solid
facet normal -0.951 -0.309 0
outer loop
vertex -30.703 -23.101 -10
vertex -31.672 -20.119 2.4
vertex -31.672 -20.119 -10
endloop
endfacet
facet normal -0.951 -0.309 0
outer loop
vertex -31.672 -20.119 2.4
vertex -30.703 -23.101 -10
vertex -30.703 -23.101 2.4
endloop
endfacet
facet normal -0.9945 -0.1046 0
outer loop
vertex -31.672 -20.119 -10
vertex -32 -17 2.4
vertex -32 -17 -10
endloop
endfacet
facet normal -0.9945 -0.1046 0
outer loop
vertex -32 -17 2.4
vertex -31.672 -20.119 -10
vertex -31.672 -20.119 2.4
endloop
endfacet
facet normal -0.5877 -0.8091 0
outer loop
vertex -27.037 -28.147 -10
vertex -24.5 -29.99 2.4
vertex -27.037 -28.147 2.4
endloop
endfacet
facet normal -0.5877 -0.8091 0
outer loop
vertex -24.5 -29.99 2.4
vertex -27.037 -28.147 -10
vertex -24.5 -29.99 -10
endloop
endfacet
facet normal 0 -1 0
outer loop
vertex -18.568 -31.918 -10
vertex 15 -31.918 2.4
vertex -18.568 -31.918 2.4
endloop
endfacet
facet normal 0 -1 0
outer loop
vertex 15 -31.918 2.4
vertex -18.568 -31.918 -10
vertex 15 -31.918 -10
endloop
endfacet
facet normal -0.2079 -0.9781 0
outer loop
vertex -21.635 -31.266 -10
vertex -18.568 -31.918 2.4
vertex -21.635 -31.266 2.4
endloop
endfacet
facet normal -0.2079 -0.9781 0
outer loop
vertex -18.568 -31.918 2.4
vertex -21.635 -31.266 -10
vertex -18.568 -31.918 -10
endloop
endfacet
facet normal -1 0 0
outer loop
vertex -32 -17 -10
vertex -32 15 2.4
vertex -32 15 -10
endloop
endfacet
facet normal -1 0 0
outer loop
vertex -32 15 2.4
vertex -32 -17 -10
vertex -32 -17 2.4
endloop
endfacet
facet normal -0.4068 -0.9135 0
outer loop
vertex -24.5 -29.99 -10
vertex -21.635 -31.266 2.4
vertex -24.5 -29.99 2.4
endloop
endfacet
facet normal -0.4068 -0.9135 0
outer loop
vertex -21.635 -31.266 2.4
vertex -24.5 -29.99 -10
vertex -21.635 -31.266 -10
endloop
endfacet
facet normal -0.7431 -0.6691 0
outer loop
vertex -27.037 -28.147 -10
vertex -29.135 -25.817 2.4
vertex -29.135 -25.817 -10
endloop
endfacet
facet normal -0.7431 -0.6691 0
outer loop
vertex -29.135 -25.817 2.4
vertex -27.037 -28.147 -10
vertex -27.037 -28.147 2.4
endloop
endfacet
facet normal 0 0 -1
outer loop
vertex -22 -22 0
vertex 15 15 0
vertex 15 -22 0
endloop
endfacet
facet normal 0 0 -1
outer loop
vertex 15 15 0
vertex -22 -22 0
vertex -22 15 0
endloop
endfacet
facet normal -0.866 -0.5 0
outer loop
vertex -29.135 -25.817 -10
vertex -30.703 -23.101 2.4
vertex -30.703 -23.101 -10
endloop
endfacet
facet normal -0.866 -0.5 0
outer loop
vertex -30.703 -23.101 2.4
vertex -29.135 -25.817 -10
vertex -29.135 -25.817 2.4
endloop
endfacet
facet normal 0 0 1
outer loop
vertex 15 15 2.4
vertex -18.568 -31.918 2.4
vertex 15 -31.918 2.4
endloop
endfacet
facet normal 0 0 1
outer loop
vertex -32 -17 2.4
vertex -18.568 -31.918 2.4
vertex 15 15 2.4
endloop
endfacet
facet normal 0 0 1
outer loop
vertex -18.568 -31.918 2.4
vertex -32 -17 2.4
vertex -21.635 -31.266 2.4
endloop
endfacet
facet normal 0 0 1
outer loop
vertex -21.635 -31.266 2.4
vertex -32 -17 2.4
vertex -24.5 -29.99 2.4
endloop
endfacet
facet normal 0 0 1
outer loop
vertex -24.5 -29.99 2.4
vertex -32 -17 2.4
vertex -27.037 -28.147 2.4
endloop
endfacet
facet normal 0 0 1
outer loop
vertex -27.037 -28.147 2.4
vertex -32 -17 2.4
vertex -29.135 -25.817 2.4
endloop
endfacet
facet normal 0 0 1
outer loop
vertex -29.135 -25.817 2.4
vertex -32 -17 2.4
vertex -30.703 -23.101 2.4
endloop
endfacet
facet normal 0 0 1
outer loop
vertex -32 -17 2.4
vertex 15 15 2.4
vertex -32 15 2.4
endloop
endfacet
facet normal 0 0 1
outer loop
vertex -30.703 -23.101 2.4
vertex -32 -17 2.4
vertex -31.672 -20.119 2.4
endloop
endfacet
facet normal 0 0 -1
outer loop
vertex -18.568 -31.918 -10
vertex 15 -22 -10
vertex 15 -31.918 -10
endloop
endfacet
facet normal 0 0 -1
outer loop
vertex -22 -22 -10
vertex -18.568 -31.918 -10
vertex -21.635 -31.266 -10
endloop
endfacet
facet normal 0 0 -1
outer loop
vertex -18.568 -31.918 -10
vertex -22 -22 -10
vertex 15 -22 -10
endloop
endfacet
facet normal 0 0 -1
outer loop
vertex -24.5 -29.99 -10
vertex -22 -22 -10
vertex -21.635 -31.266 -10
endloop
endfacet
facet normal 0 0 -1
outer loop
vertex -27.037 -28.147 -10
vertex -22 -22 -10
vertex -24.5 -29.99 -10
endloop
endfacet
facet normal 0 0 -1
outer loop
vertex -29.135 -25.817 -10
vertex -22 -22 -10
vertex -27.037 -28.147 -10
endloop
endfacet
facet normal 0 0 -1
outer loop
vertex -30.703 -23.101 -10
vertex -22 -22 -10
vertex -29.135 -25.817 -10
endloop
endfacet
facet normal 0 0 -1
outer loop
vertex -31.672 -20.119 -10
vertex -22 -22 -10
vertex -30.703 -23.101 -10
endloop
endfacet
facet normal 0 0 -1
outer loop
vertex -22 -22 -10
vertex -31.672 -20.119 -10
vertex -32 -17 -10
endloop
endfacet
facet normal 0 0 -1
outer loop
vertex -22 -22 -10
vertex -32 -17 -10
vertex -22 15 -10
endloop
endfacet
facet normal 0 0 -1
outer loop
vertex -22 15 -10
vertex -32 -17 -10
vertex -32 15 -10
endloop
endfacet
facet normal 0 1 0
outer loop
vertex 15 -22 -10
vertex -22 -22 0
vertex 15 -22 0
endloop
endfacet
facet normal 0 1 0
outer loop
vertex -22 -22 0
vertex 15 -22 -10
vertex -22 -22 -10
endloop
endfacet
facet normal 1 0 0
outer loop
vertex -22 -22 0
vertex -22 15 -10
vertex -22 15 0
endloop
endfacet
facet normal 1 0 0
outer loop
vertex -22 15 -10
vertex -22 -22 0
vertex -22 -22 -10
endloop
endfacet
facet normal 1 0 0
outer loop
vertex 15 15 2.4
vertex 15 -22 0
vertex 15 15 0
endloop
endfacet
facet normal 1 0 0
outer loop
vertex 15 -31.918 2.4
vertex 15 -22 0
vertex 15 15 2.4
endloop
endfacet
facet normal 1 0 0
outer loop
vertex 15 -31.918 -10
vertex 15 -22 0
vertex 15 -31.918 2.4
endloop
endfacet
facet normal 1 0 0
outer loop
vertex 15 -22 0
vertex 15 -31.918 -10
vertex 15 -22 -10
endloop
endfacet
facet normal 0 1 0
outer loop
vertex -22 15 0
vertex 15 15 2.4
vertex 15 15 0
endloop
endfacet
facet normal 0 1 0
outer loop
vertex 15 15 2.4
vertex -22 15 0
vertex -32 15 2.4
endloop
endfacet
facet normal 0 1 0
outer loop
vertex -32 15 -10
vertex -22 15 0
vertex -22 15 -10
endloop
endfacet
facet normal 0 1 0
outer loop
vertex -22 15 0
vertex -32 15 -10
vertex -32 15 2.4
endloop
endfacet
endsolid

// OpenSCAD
// file: ../../lib/project/util.scad
// lib/project/util.scad

module rounded_rect_2d(size = [10, 10], r = 2) {
  x = size[0];
  y = size[1];
  rr = min(r, min(x, y) / 2);

  hull() {
    for (sx = [-1, 1], sy = [-1, 1]) {
      translate([sx * (x / 2 - rr), sy * (y / 2 - rr)])
        circle(r = rr);
    }
  }
}
// file: ../../lib/project/params.scad
// lib/project/params.scad
// Shared project parameters for the final tray and all fit-test models.

debug = false;

// Main tray footprint.
tray_corner_r = 15;

// Top tray shell.
tray_floor_t = 2.4;
tray_wall_h = 9;
top_wall_w = 10;

// Underside support lip and rear support section.
support_lip_drop = 10;
support_lip_w = 10;
console_clear_w = 320;
side_lip_run = 170;
tray_w = console_clear_w + 2 * support_lip_w;
tray_d = side_lip_run + support_lip_w;
rear_gap_w = 28;
rear_tongue_w = 170;
rear_tongue_depth = 34;
rear_tongue_t = 1.8;

// Cup holder location and plug geometry.
cup_spacing = 135;
cup_y_from_front = 72;
plug_top_d = 90;
plug_bottom_d = 78;
plug_h = 73;
plug_clearance_z = 0;
cup_rim_w = 7.5;
cup_rim_h = 5;

// Fit-test defaults.
test_plug_top_ds = [84, 85, 86];
test_spacing_values = [116, 118, 120];
test_lip_drop_values = [8, 10, 12];
test_rear_tongue_ts = [1.4, 1.8, 2.2];
test_frame_wall_w = 12;
test_front_zone_depth = 100;
test_rear_zone_depth = 56;
test_gap_section_w = 140;
test_coupon_spacing = 18;
// main file
use <../../lib/project/console_tray.scad>;
include <../../lib/project/params.scad>;

coupon_size = 64;
support_lip_drop_test = support_lip_drop;

front_corner_lip_coupon(
  tray_corner_r = tray_corner_r,
  coupon_size = coupon_size,
  tray_floor_t = tray_floor_t,
  support_lip_drop = support_lip_drop_test,
  support_lip_w = support_lip_w
);
